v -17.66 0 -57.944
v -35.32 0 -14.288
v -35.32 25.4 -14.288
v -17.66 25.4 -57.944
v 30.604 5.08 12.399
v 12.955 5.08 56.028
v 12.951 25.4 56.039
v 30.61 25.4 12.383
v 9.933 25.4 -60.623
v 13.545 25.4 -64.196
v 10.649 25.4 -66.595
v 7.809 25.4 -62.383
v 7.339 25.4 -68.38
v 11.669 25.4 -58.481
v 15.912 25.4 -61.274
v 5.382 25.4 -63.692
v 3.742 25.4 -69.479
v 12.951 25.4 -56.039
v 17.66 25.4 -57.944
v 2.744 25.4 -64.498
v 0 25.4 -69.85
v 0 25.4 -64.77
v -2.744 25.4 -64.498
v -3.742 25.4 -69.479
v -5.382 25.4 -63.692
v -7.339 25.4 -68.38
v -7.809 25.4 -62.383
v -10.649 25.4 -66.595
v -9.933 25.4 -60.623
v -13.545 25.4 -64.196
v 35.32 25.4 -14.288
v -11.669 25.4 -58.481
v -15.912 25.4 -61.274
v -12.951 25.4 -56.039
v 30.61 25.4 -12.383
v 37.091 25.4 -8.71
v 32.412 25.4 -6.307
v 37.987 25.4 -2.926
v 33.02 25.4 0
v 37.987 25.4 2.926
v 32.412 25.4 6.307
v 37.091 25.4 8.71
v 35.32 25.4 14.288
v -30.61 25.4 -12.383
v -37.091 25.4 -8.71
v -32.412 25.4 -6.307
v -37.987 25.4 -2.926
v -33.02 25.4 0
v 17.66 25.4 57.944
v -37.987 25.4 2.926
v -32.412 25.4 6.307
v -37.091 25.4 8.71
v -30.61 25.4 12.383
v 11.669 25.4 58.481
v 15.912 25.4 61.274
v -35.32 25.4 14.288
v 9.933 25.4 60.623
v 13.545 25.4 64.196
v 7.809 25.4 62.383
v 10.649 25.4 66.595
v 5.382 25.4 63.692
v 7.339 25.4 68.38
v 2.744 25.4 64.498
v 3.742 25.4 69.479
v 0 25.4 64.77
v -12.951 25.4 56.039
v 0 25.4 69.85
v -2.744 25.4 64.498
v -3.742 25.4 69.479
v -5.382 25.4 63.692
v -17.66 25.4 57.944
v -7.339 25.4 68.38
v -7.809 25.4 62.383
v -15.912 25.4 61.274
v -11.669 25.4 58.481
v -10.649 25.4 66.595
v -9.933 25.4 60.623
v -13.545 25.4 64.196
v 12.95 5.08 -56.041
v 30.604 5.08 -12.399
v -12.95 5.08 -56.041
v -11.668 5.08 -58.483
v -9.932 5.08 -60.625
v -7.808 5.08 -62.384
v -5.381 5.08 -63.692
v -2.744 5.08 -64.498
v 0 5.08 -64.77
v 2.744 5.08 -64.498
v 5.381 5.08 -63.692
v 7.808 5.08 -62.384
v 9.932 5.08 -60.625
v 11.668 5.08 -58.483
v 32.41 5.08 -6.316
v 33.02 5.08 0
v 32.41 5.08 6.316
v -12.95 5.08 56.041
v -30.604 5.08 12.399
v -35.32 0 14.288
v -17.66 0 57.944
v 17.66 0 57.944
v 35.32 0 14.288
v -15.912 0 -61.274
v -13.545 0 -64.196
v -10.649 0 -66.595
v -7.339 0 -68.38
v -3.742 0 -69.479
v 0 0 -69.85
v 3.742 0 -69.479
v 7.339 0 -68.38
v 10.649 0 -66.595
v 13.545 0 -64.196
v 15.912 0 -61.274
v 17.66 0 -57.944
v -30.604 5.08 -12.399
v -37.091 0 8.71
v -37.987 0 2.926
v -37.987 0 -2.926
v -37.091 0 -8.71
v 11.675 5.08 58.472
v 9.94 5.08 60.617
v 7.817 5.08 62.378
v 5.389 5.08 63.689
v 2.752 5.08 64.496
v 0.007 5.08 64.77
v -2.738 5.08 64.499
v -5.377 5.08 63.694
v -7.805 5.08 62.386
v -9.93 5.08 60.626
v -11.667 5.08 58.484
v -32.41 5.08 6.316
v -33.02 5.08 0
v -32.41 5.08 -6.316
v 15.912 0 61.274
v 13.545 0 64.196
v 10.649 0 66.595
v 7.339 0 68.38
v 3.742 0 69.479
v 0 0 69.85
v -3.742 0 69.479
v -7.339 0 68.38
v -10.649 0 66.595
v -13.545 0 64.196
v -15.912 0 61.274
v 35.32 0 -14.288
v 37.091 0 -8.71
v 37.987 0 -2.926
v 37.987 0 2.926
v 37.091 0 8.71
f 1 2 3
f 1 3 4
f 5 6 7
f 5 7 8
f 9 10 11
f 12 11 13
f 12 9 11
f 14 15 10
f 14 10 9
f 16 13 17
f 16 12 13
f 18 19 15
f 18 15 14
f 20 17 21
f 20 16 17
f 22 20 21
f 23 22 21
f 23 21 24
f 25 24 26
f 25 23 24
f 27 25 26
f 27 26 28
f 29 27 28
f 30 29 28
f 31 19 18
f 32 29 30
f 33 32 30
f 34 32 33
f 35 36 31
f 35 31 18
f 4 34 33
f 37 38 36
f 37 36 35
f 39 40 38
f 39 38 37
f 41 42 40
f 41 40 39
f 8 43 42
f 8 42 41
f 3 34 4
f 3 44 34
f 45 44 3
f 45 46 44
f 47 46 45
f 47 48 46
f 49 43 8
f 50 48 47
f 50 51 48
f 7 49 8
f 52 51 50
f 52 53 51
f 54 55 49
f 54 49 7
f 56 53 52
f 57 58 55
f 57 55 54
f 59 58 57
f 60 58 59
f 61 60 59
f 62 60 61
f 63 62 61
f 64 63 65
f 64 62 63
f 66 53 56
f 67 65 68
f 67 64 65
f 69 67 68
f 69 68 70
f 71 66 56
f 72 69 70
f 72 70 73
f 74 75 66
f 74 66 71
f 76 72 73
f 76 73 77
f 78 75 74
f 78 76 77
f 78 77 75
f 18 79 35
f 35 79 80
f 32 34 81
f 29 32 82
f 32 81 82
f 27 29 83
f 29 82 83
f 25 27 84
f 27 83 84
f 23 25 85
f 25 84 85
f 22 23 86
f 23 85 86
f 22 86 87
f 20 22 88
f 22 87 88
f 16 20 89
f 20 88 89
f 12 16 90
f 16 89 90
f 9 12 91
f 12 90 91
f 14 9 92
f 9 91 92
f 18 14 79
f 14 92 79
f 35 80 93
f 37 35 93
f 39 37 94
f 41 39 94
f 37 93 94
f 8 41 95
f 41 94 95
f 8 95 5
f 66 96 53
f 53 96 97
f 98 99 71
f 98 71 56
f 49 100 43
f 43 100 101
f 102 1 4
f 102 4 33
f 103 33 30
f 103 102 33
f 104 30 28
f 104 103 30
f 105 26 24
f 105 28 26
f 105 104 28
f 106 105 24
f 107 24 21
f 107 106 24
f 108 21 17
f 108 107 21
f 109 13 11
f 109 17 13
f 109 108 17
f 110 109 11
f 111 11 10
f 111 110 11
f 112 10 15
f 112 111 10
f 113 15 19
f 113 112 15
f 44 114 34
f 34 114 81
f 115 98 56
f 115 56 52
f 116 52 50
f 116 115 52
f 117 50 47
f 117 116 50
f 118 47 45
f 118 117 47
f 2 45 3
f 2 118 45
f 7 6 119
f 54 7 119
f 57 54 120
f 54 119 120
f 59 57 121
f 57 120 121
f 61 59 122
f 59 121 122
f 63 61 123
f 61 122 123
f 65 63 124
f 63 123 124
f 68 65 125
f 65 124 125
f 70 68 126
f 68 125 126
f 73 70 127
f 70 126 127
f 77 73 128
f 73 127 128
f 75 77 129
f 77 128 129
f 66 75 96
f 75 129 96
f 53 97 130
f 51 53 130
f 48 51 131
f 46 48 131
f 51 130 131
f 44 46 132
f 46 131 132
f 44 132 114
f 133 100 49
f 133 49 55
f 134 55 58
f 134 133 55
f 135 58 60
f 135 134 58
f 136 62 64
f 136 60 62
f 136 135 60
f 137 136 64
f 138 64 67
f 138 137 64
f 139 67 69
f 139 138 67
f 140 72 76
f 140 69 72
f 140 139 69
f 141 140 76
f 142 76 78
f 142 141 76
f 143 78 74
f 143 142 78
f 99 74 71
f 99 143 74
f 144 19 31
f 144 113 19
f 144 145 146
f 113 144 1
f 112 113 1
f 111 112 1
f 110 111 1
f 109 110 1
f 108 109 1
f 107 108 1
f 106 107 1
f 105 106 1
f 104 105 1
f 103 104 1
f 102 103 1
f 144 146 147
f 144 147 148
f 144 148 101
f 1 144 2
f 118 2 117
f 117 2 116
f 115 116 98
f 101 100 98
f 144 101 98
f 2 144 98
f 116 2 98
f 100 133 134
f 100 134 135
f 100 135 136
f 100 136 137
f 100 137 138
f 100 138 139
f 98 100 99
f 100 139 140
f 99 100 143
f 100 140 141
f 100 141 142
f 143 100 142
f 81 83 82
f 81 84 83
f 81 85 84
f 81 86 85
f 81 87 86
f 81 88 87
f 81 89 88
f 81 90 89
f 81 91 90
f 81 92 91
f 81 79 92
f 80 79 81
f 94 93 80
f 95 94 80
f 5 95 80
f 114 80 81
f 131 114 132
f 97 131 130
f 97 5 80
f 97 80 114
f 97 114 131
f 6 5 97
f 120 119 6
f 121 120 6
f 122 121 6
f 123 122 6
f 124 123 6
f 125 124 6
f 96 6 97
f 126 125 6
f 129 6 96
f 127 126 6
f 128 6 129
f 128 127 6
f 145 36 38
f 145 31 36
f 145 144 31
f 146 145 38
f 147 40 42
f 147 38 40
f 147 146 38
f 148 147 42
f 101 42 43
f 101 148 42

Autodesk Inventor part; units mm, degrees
ref_plane "YZ Plane" through (0, 0, 0) normal (1, 0, 0) x (0, 1, 0)
ref_plane "XZ Plane" through (0, 0, 0) normal (0, 1, 0) x (-1, 0, 0)
ref_plane "XY Plane" through (0, 0, 0) normal (0, 0, 1) x (1, 0, 0)
sketch "Sketch3" plane through (0, 0, 0) normal (0, 1, 0) x (-1, 0, 0)
  circle A0 centre (0, 0) radius 38.1
  circle A1 centre (0, -50.8) radius 19.05
  circle A2 centre (0, 50.8) radius 19.05
  line L0 (17.6598, 57.9438) -> (35.3196, 14.2875)
  line L1 (35.3196, -14.2875) -> (17.6598, -57.9438)
  line L2 (-17.6598, -57.9438) -> (-35.3196, -14.2875)
  line L3 (-17.6598, 57.9437) -> (-35.3196, 14.2875)
  dimension "d22" = 76.2
  dimension "d23" = 38.1
  dimension "d24" = 38.1
  dimension "d25" = 50.8
  dimension "d26" = 50.8
extrude "Extrusion2" add sketch "Sketch3" along normal blind 25.4
shell "Shell3" thickness 5.08 removed faces 1 at (-5.8866, 25.4, -28.8396)
properties part number "Diamond-Box"
